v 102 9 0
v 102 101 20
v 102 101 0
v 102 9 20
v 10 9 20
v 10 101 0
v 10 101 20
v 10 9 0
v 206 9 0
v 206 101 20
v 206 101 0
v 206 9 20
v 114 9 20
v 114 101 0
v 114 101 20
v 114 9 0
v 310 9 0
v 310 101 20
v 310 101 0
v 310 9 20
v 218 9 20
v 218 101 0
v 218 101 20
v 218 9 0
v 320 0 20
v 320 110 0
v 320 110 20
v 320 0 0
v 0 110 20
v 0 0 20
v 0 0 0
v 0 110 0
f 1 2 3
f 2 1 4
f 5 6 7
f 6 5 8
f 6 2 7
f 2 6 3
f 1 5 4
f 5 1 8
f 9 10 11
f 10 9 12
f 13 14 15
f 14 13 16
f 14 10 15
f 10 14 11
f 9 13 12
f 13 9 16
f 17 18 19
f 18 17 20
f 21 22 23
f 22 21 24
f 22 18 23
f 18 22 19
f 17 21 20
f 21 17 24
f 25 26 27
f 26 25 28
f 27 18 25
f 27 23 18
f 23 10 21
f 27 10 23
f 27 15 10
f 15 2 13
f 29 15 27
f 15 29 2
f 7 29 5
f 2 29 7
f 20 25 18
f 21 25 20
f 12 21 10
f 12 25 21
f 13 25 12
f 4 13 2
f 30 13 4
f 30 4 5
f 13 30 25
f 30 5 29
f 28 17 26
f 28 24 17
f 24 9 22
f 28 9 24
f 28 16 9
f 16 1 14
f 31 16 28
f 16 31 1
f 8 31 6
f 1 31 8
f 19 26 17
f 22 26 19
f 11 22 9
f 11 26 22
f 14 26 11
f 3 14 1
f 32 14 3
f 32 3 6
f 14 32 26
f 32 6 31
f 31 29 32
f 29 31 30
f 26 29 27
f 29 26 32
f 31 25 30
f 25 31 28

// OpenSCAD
$fn = 50;  // High resolution for smooth curves

// ======================================
// PARAMETERS
// ======================================

// Shroud dimensions
shroud_length = 320;
shroud_width  = 110;
shroud_thick  = 20;   // 20 mm thick (3D printed plastic)

// Fan cutout parameters (each fan is 92x92 mm)
fan_size       = 92;
margin_left    = 10;
margin_right   = 10;
available_length = shroud_length - margin_left - margin_right;
gap_between    = ( available_length - 3 * fan_size ) / 2;
margin_top     = ( shroud_width - fan_size ) / 2;

// Fan mounting screw-hole parameters
screw_dia   = 4;       // mm diameter
screw_depth = shroud_thick + 1;  // mm (ensures complete through-cut)
screw_inset = 6;       // mm inset from fan cutout edges

// -------------------------------
// Pop‑on Hook (Half‑Spade) Parameters
// -------------------------------
hook_width       = 50;   // Horizontal extent of the hook (in its 2D profile)
hook_depth       = 15;   // Depth of the 2D profile (controls the pointed tip)
hook_y_thickness = 20;   // Thickness (extrusion) of the hook along its original y direction

// ======================================
// MODULES
// ======================================

// Base shroud: a rectangular plate.
module base_plate() {
  cube([shroud_length, shroud_width, shroud_thick]);
}

// Fan cutouts: three square openings.
module fan_cutouts() {
  union() {
    for(i = [0:2]) {
      translate([ margin_left + i*(fan_size + gap_between), margin_top, -1 ])
        // Extra height ensures a complete through-cut.
        cube([fan_size, fan_size, shroud_thick + 2]);
    }
  }
}

// Fan mounting screw holes: one at each corner of every fan cutout.
module fan_screw_holes() {
  union() {
    for(i = [0:2]) {
      fan_origin = margin_left + i*(fan_size + gap_between);
      for(x_off = [screw_inset, fan_size - screw_inset])
        for(y_off = [margin_top + screw_inset, margin_top + fan_size - screw_inset])
          translate([ fan_origin + x_off, y_off, 0 ])
            cylinder(h = screw_depth, r = screw_dia/2, center = false);
    }
  }
}

// Pop‑on hook defined as half a spade.
// The 2D polygon is drawn in the XY plane (with y negative meaning “downward”).
// We then extrude it and reorient it so that it extends downward (negative z).
module pop_hook_half_spade() {
    triangle = [
      [0, 0], [hook_width, 0], [hook_width/2, hook_depth]
    ];    
    linear_extrude(height = hook_y_thickness)
      rotate([90, 0, 0])
        translate([0, -hook_depth, 0])
          polygon(triangle);
}

// Combine the base plate with the pop‑on hook.
module shroud_with_hook() {
  union() {
    base_plate();
    pop_hook_half_spade();
  }
}

// Final shroud: subtract fan cutouts and screw holes.
module final_shroud() {
  difference() {
    shroud_with_hook();
    fan_cutouts();
    fan_screw_holes();
  }
}

// ======================================
// RENDER THE MODEL
// ======================================
final_shroud();
